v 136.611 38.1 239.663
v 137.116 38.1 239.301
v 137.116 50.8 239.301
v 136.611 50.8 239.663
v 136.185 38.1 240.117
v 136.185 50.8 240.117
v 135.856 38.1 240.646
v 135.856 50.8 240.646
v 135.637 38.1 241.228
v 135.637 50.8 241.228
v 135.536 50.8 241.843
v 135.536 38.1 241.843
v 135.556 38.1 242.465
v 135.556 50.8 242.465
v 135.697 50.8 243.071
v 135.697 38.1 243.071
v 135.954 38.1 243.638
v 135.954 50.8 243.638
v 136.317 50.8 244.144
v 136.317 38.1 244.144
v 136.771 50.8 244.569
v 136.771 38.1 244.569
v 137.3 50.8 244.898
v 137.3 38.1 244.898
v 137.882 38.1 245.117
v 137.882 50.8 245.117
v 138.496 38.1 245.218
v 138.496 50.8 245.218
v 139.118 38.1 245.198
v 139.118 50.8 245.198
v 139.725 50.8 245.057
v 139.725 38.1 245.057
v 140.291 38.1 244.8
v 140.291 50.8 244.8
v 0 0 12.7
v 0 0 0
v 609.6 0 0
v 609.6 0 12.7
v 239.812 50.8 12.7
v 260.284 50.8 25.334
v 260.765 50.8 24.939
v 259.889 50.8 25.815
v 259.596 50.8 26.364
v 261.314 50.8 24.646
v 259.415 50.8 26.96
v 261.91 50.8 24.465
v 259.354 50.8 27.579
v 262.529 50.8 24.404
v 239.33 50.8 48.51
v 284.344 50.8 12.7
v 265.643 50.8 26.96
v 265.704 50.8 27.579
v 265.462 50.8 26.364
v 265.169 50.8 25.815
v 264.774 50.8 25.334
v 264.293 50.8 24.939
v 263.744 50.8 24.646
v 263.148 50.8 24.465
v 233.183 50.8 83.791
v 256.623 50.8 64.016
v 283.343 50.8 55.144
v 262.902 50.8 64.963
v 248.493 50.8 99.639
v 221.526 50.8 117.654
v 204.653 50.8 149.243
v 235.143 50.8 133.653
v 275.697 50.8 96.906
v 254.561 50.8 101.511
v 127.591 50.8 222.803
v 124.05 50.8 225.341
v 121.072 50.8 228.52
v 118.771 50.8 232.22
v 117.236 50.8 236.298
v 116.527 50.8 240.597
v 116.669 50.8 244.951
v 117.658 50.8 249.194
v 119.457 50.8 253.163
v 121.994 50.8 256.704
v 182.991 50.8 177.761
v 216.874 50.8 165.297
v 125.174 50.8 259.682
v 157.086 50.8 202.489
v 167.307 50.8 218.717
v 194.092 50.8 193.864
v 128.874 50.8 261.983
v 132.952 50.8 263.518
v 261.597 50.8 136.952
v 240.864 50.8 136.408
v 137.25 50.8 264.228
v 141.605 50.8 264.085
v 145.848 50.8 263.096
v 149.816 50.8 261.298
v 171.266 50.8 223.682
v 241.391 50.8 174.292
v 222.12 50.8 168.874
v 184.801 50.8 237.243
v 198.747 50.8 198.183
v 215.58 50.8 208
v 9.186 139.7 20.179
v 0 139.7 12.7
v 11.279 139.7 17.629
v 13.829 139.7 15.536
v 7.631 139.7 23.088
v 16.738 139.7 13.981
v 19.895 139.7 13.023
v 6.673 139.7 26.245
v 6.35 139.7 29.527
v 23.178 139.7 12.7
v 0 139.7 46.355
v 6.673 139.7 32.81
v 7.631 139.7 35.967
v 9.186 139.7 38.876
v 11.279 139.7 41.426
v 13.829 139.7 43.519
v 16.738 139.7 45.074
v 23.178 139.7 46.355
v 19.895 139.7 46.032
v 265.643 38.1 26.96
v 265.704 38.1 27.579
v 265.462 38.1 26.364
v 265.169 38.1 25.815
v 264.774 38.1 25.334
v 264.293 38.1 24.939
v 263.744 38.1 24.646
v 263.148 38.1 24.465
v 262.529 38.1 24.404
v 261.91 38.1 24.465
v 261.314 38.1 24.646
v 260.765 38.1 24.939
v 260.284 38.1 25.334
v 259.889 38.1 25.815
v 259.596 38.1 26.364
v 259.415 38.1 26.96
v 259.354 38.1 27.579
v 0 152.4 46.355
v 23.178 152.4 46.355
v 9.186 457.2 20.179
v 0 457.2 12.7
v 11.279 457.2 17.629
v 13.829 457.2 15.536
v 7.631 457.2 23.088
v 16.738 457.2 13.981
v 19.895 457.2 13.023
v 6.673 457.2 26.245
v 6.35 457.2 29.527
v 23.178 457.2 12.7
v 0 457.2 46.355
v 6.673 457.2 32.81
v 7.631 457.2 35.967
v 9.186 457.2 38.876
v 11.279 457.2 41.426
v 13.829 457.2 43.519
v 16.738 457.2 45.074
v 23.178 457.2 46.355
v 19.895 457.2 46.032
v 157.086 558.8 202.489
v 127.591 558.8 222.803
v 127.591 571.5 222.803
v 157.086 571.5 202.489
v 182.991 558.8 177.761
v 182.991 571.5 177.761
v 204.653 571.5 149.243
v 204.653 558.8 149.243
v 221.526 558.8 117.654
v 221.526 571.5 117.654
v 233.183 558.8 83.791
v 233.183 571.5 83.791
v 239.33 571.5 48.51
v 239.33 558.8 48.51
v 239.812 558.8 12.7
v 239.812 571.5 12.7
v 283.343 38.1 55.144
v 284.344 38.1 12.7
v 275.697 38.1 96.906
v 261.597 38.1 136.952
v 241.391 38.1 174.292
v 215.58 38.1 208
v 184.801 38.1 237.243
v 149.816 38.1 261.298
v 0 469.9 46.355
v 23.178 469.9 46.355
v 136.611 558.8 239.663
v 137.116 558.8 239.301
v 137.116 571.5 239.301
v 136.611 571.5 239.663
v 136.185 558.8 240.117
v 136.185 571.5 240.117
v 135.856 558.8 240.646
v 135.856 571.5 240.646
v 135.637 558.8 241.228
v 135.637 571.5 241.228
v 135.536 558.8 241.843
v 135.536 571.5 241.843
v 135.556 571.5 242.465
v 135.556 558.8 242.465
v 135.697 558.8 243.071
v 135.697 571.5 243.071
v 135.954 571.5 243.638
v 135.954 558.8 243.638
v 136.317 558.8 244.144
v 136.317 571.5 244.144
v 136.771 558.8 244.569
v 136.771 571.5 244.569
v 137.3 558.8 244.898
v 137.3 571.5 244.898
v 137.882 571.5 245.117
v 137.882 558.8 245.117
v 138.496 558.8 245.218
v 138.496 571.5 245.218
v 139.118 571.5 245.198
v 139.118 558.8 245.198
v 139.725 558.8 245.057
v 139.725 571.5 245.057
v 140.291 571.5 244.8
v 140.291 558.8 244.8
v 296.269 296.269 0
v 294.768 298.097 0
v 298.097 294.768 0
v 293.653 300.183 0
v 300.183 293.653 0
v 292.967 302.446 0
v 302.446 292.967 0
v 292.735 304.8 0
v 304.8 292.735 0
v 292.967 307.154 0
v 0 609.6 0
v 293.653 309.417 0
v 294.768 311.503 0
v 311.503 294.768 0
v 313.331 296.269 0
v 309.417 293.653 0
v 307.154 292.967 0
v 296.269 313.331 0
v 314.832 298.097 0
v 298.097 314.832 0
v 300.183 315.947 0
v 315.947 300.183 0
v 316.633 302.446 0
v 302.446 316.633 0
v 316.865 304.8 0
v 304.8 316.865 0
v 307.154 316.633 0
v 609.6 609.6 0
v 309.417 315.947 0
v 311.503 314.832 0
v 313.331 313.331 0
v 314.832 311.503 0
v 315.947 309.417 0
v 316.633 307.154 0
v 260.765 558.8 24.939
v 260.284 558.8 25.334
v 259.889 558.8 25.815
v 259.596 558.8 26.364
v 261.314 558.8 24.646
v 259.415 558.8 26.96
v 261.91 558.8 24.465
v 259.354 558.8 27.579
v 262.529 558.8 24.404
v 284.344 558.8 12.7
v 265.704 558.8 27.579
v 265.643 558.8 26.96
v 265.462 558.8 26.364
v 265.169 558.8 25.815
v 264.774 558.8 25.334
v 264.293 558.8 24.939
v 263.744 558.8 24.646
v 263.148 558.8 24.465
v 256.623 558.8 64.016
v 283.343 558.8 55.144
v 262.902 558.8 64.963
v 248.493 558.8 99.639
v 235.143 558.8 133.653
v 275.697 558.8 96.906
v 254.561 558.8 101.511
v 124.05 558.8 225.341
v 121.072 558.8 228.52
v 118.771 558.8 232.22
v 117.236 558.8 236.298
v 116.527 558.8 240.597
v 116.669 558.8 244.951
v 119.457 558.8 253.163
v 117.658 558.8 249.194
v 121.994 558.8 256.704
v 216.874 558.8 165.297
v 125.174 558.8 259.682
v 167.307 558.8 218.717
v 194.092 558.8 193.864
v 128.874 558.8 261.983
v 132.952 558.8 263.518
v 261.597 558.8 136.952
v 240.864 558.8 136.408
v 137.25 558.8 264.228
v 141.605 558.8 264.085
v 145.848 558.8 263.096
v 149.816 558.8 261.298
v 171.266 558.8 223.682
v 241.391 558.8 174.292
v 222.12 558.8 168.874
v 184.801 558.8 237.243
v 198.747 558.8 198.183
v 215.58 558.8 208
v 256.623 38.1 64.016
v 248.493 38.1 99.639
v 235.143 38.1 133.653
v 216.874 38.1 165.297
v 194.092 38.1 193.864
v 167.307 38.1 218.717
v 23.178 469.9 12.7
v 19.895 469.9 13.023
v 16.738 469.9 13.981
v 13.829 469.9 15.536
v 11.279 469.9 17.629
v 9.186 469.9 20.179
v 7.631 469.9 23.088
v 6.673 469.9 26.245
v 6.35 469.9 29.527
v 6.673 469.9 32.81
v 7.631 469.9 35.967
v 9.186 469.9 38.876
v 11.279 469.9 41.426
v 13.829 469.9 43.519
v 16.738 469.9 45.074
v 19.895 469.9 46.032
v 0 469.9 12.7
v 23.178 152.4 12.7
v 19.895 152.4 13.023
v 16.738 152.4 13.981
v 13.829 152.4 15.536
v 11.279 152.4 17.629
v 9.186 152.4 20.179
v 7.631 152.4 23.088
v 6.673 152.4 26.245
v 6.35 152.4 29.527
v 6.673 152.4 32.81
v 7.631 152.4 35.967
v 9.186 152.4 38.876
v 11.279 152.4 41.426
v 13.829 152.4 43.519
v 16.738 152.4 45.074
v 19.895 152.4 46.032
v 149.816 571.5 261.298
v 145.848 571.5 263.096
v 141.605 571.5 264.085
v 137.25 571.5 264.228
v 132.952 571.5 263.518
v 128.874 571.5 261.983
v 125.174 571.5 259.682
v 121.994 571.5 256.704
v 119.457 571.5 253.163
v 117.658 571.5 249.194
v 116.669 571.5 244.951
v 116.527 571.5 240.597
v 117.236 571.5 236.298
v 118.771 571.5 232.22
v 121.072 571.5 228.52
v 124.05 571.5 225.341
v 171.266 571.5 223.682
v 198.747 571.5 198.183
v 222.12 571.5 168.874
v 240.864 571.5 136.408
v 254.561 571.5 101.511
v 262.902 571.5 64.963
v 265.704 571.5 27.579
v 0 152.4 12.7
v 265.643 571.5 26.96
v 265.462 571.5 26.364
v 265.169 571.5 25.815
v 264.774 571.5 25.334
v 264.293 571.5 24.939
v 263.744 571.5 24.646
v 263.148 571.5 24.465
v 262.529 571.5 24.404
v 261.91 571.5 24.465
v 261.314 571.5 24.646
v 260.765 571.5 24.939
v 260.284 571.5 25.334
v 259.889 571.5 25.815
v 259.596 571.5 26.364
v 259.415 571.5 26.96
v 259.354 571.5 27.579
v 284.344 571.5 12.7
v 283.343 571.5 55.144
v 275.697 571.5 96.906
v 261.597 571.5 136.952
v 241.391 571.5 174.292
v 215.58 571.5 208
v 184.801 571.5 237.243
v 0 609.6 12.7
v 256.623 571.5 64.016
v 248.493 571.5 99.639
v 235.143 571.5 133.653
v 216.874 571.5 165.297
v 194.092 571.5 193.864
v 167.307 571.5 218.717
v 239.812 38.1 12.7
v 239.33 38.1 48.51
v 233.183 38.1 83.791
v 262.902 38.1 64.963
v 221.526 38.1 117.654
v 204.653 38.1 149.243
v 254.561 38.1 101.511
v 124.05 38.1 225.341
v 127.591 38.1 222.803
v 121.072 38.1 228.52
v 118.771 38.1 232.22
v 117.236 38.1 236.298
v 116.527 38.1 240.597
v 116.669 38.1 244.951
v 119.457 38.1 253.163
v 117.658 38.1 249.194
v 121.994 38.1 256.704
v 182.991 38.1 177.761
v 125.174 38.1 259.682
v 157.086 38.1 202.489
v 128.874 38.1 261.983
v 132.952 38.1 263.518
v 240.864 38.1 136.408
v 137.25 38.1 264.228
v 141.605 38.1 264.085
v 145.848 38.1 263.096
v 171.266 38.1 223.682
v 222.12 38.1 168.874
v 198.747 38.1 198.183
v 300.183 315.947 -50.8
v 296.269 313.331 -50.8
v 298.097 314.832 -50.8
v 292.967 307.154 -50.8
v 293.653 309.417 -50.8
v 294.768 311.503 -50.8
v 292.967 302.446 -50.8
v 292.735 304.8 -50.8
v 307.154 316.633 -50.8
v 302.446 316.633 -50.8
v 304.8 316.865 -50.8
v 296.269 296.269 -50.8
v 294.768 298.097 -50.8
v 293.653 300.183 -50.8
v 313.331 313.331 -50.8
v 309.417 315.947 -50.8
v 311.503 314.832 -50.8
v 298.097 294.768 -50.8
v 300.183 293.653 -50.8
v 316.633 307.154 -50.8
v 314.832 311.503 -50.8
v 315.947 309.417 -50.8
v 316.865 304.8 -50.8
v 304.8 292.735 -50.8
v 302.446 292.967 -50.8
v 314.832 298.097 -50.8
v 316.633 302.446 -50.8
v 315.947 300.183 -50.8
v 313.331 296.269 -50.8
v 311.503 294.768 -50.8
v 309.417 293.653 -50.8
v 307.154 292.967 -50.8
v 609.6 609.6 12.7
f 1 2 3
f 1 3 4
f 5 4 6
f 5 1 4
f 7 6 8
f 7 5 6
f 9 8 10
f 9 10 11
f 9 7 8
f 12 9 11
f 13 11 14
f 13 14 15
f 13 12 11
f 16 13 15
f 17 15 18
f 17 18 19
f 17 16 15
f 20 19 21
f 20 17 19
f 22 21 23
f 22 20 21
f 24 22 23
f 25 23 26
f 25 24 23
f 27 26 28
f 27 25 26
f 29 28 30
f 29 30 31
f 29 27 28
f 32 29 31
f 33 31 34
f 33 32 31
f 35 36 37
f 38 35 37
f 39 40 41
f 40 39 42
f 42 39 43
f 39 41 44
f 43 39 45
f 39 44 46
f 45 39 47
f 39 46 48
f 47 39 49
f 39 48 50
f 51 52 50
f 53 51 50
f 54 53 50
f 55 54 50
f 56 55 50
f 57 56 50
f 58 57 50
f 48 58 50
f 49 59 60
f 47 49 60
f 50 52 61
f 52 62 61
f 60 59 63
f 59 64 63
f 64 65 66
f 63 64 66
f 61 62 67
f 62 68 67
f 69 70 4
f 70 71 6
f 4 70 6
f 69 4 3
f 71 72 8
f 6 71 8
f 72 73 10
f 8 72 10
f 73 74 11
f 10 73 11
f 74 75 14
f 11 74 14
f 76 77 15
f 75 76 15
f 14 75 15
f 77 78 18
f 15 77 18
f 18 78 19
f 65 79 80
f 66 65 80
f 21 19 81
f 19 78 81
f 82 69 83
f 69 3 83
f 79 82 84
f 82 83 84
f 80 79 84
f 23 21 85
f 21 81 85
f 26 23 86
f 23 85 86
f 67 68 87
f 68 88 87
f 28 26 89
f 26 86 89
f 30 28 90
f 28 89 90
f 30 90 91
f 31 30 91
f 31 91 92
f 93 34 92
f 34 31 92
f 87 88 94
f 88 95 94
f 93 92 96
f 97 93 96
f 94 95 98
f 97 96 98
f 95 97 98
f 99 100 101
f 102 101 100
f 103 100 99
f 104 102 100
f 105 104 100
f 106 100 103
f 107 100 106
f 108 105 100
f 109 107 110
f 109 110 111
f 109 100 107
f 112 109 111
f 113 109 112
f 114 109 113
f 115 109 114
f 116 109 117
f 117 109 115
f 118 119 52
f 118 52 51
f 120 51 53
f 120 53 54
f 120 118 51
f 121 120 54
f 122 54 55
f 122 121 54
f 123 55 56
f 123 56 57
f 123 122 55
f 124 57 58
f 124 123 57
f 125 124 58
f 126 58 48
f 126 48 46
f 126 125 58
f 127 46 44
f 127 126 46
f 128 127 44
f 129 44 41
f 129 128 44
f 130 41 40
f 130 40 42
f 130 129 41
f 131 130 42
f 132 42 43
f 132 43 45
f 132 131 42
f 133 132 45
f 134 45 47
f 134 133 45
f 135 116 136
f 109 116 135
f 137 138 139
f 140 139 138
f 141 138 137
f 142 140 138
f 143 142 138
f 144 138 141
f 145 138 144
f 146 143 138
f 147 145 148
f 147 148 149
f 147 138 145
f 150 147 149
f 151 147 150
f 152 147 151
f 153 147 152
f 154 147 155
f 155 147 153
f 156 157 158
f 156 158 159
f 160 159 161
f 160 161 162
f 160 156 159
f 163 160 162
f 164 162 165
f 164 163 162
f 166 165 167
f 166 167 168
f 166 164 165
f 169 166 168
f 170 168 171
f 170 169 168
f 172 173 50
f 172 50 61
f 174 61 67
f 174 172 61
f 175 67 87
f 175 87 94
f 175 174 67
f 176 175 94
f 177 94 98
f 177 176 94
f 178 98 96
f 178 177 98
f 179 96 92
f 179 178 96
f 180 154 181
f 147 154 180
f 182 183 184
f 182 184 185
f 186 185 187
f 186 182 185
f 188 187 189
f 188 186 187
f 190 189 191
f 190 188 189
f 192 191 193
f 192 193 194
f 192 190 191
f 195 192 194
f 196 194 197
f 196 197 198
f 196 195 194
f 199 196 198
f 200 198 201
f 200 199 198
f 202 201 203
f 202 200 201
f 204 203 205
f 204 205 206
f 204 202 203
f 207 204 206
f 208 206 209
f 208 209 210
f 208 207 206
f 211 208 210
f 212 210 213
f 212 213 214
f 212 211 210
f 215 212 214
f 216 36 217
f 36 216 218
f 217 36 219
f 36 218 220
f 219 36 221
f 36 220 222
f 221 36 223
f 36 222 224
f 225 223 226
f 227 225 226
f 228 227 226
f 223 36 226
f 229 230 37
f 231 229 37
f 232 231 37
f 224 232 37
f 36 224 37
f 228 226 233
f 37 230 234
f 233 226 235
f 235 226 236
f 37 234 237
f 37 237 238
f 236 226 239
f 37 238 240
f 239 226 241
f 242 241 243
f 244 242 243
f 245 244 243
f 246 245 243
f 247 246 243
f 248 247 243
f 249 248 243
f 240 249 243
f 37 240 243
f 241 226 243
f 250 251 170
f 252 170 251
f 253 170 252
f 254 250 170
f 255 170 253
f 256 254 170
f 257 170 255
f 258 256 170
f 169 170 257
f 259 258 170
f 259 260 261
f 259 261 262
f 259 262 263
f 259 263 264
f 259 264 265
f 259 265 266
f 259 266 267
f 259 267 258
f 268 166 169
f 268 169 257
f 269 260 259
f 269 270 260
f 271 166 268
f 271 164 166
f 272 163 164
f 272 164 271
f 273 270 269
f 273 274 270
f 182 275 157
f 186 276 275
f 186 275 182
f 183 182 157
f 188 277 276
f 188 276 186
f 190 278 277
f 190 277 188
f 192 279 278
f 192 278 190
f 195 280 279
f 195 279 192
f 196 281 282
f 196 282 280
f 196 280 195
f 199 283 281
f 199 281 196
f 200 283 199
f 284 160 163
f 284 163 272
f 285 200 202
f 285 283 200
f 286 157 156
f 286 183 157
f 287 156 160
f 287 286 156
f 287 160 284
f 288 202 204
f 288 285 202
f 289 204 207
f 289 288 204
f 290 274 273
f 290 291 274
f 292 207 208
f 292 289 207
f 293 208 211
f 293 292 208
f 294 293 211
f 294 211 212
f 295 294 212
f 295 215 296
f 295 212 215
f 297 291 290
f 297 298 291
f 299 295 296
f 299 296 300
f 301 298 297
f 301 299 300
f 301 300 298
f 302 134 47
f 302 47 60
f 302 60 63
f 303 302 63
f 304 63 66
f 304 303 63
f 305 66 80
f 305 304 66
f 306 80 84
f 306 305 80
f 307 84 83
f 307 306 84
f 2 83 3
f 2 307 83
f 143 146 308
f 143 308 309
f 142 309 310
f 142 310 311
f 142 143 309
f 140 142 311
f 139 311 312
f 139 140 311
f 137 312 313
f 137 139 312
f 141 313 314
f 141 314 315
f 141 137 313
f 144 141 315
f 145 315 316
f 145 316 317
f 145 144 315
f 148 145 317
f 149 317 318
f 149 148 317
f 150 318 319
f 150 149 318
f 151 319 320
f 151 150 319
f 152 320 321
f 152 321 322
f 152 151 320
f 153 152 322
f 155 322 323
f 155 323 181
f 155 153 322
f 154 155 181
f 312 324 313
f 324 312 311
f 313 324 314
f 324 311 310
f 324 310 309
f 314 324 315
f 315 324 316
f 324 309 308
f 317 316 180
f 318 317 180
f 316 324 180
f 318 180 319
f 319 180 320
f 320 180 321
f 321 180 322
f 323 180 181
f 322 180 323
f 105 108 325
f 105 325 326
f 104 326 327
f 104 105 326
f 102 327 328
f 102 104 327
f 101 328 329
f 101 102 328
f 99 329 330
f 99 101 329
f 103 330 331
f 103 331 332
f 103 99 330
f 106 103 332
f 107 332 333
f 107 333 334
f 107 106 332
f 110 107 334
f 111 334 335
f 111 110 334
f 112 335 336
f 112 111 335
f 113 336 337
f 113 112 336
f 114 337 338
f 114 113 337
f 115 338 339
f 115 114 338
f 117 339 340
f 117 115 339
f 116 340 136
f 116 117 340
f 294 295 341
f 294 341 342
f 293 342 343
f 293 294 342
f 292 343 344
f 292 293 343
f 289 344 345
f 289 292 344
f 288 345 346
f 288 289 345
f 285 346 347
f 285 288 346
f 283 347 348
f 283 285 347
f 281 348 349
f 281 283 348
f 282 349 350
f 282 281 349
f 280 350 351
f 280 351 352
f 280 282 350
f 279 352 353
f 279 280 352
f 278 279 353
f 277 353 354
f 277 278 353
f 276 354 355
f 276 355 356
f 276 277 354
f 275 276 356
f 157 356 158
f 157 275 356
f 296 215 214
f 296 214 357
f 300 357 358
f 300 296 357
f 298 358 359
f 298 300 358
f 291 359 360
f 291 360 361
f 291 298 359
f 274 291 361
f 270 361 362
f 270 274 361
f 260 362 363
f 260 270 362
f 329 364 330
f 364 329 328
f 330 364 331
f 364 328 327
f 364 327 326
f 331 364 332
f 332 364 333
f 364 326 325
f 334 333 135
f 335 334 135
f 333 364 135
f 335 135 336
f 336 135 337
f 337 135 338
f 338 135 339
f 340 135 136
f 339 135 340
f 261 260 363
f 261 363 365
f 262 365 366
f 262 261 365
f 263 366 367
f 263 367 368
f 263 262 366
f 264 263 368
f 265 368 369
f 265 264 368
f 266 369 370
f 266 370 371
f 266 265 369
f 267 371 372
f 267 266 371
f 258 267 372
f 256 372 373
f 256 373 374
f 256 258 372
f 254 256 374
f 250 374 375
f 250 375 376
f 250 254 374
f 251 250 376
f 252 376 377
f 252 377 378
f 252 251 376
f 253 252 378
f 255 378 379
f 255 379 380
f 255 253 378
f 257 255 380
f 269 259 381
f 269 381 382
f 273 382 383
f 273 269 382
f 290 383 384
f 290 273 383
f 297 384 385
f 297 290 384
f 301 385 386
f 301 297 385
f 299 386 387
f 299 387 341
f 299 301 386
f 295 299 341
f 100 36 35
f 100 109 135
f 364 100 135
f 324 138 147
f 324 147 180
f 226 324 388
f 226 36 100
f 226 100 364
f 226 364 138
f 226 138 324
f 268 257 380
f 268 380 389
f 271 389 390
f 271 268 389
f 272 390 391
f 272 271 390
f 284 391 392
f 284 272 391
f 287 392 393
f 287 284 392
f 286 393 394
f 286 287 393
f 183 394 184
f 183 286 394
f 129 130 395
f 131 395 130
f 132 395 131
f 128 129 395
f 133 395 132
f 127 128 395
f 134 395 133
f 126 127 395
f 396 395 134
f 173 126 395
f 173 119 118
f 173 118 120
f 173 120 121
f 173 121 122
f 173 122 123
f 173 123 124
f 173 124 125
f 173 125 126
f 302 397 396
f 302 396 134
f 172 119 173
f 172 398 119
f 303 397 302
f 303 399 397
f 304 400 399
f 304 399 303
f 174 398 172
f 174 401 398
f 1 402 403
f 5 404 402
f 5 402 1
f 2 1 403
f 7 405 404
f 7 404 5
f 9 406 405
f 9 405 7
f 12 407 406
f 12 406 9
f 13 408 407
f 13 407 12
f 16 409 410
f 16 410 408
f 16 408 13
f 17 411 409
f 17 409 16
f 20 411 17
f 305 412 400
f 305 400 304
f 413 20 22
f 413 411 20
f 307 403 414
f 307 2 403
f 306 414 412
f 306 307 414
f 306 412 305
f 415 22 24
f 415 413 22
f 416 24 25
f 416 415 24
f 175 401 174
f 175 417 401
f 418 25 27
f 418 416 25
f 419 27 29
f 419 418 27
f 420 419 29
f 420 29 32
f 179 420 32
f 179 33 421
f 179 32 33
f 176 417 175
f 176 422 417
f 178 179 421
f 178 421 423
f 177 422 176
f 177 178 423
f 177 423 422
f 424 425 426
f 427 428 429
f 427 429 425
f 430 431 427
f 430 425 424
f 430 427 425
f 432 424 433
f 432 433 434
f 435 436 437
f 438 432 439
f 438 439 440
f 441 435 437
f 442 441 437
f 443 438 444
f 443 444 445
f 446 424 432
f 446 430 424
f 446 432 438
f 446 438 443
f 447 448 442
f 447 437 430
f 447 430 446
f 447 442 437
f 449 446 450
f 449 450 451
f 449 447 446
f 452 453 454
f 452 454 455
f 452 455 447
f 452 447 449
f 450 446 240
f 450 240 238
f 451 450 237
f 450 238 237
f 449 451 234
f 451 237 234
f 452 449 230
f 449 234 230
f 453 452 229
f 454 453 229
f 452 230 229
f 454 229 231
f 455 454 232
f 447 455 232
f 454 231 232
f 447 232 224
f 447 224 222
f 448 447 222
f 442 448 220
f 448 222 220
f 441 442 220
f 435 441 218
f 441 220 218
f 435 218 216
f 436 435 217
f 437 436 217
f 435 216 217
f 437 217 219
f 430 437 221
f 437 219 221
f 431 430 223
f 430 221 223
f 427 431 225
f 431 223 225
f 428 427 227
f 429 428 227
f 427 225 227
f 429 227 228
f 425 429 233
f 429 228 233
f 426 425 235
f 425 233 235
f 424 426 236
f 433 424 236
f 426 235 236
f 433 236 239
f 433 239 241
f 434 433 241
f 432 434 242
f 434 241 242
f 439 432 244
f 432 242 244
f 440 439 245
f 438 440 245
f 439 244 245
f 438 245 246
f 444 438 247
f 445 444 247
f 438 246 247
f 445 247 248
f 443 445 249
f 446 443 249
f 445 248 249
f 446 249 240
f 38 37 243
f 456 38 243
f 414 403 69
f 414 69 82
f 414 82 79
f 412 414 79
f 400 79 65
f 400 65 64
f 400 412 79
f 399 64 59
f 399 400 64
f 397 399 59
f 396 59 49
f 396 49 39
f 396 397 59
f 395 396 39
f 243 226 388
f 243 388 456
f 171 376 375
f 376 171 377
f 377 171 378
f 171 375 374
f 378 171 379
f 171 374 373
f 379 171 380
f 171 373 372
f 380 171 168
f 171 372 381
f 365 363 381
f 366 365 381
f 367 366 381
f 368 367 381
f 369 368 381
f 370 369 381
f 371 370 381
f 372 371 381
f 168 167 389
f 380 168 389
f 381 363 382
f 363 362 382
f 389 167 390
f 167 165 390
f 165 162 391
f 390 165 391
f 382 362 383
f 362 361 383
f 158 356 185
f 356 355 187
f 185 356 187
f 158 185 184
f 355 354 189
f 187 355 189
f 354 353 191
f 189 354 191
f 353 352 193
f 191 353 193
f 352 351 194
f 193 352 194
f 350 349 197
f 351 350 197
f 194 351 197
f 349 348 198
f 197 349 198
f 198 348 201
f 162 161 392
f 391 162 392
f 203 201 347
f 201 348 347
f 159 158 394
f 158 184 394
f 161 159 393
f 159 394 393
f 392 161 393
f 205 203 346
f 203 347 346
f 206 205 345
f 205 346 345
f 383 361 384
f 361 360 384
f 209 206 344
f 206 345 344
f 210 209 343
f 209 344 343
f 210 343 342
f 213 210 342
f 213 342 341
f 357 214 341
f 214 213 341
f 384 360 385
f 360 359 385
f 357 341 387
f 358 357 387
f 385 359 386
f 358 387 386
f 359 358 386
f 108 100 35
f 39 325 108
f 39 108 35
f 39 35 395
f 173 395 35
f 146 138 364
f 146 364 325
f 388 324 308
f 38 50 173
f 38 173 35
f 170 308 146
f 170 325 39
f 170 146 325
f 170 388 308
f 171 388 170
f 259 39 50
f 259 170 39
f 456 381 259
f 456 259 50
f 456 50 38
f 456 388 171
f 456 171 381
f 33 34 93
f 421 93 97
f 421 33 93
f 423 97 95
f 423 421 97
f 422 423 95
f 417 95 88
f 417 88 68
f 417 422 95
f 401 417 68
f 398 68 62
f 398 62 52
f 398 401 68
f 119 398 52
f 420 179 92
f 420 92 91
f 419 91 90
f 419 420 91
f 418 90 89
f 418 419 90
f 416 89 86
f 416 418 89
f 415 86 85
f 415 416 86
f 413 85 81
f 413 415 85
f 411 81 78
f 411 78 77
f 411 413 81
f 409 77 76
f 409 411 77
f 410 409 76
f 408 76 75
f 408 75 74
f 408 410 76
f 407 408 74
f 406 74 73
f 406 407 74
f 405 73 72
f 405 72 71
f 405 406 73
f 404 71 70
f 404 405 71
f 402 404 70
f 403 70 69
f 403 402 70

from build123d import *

# Parameters (mm, degrees)
F0_W      = 609.6
F0_H      = 609.6
F1_DEPTH  = 12.7
F2_R      = 12.065
F3_DEPTH  = 50.8
F7_DEPTH  = 266.7
F8_DEPTH  = 254
F9_DEPTH  = 165.1
F10_DEPTH = 152.4


with BuildPart() as f1:
    # F0 (on Top) → F1 (new body)
    with BuildSketch(Plane.XY):
        with Locations((304.8, 304.8)):
            Rectangle(F0_W, F0_H)
    extrude(amount=F1_DEPTH)

    # F2 (on face) → F3 (join)
    with BuildSketch(Plane(origin=(0, 0, 0), x_dir=(1, 0, 0), z_dir=(0, 0, -1))):
        with Locations((304.8, -304.8)):
            Circle(F2_R)
    extrude(amount=F3_DEPTH)

    # F6 (on offset) → F7 (join, symmetric)
    with BuildSketch(Plane.XZ.offset(-304.8)):
        with BuildLine():
            ThreePointArc((127.591476, 222.802752), (213.718068, 133.783712), (239.812403, 12.7))
            Line((239.812403, 12.7), (284.343503, 12.7))
            ThreePointArc((284.343503, 12.7), (252.229854, 156.01992), (149.816476, 261.297581))
            ThreePointArc((149.816476, 261.297581), (119.456561, 253.162667), (127.591476, 222.802752))
        make_face()
        with BuildLine():
            ThreePointArc((265.703976, 27.578975), (262.528976, 24.403975), (259.353976, 27.578975))
            ThreePointArc((259.353976, 27.578975), (226.600536, 149.816475), (137.116476, 239.300536))
            ThreePointArc((137.116476, 239.300536), (135.954345, 243.637667), (140.291476, 244.799797))
            ThreePointArc((140.291476, 244.799797), (232.099797, 152.991475), (265.703976, 27.578975))
        make_face(mode=Mode.SUBTRACT)
    extrude(amount=F7_DEPTH, both=True)

    # F6 (on offset) → F8 (cut, symmetric)
    with BuildSketch(Plane.XZ.offset(-304.8)):
        with BuildLine():
            ThreePointArc((127.591476, 222.802752), (213.718068, 133.783712), (239.812403, 12.7))
            Line((239.812403, 12.7), (284.343503, 12.7))
            ThreePointArc((284.343503, 12.7), (252.229854, 156.01992), (149.816476, 261.297581))
            ThreePointArc((149.816476, 261.297581), (119.456561, 253.162667), (127.591476, 222.802752))
        make_face()
        with BuildLine():
            ThreePointArc((265.703976, 27.578975), (262.528976, 24.403975), (259.353976, 27.578975))
            ThreePointArc((259.353976, 27.578975), (226.600536, 149.816475), (137.116476, 239.300536))
            ThreePointArc((137.116476, 239.300536), (135.954345, 243.637667), (140.291476, 244.799797))
            ThreePointArc((140.291476, 244.799797), (232.099797, 152.991475), (265.703976, 27.578975))
        make_face(mode=Mode.SUBTRACT)
    extrude(amount=F8_DEPTH, both=True, mode=Mode.SUBTRACT)

    # F5 (on offset) → F9 (join, symmetric)
    with BuildSketch(Plane.XZ.offset(-304.8)):
        with BuildLine():
            Line((0, 46.355), (0, 12.7))
            Line((0, 12.7), (23.1775, 12.7))
            ThreePointArc((23.1775, 12.7), (6.35, 29.5275), (23.1775, 46.355))
            Line((23.1775, 46.355), (0, 46.355))
        make_face()
    extrude(amount=F9_DEPTH, both=True)

    # F5 (on offset) → F10 (cut, symmetric)
    with BuildSketch(Plane.XZ.offset(-304.8)):
        with BuildLine():
            Line((0, 46.355), (0, 12.7))
            Line((0, 12.7), (23.1775, 12.7))
            ThreePointArc((23.1775, 12.7), (6.35, 29.5275), (23.1775, 46.355))
            Line((23.1775, 46.355), (0, 46.355))
        make_face()
    extrude(amount=F10_DEPTH, both=True, mode=Mode.SUBTRACT)


solid = f1.part
